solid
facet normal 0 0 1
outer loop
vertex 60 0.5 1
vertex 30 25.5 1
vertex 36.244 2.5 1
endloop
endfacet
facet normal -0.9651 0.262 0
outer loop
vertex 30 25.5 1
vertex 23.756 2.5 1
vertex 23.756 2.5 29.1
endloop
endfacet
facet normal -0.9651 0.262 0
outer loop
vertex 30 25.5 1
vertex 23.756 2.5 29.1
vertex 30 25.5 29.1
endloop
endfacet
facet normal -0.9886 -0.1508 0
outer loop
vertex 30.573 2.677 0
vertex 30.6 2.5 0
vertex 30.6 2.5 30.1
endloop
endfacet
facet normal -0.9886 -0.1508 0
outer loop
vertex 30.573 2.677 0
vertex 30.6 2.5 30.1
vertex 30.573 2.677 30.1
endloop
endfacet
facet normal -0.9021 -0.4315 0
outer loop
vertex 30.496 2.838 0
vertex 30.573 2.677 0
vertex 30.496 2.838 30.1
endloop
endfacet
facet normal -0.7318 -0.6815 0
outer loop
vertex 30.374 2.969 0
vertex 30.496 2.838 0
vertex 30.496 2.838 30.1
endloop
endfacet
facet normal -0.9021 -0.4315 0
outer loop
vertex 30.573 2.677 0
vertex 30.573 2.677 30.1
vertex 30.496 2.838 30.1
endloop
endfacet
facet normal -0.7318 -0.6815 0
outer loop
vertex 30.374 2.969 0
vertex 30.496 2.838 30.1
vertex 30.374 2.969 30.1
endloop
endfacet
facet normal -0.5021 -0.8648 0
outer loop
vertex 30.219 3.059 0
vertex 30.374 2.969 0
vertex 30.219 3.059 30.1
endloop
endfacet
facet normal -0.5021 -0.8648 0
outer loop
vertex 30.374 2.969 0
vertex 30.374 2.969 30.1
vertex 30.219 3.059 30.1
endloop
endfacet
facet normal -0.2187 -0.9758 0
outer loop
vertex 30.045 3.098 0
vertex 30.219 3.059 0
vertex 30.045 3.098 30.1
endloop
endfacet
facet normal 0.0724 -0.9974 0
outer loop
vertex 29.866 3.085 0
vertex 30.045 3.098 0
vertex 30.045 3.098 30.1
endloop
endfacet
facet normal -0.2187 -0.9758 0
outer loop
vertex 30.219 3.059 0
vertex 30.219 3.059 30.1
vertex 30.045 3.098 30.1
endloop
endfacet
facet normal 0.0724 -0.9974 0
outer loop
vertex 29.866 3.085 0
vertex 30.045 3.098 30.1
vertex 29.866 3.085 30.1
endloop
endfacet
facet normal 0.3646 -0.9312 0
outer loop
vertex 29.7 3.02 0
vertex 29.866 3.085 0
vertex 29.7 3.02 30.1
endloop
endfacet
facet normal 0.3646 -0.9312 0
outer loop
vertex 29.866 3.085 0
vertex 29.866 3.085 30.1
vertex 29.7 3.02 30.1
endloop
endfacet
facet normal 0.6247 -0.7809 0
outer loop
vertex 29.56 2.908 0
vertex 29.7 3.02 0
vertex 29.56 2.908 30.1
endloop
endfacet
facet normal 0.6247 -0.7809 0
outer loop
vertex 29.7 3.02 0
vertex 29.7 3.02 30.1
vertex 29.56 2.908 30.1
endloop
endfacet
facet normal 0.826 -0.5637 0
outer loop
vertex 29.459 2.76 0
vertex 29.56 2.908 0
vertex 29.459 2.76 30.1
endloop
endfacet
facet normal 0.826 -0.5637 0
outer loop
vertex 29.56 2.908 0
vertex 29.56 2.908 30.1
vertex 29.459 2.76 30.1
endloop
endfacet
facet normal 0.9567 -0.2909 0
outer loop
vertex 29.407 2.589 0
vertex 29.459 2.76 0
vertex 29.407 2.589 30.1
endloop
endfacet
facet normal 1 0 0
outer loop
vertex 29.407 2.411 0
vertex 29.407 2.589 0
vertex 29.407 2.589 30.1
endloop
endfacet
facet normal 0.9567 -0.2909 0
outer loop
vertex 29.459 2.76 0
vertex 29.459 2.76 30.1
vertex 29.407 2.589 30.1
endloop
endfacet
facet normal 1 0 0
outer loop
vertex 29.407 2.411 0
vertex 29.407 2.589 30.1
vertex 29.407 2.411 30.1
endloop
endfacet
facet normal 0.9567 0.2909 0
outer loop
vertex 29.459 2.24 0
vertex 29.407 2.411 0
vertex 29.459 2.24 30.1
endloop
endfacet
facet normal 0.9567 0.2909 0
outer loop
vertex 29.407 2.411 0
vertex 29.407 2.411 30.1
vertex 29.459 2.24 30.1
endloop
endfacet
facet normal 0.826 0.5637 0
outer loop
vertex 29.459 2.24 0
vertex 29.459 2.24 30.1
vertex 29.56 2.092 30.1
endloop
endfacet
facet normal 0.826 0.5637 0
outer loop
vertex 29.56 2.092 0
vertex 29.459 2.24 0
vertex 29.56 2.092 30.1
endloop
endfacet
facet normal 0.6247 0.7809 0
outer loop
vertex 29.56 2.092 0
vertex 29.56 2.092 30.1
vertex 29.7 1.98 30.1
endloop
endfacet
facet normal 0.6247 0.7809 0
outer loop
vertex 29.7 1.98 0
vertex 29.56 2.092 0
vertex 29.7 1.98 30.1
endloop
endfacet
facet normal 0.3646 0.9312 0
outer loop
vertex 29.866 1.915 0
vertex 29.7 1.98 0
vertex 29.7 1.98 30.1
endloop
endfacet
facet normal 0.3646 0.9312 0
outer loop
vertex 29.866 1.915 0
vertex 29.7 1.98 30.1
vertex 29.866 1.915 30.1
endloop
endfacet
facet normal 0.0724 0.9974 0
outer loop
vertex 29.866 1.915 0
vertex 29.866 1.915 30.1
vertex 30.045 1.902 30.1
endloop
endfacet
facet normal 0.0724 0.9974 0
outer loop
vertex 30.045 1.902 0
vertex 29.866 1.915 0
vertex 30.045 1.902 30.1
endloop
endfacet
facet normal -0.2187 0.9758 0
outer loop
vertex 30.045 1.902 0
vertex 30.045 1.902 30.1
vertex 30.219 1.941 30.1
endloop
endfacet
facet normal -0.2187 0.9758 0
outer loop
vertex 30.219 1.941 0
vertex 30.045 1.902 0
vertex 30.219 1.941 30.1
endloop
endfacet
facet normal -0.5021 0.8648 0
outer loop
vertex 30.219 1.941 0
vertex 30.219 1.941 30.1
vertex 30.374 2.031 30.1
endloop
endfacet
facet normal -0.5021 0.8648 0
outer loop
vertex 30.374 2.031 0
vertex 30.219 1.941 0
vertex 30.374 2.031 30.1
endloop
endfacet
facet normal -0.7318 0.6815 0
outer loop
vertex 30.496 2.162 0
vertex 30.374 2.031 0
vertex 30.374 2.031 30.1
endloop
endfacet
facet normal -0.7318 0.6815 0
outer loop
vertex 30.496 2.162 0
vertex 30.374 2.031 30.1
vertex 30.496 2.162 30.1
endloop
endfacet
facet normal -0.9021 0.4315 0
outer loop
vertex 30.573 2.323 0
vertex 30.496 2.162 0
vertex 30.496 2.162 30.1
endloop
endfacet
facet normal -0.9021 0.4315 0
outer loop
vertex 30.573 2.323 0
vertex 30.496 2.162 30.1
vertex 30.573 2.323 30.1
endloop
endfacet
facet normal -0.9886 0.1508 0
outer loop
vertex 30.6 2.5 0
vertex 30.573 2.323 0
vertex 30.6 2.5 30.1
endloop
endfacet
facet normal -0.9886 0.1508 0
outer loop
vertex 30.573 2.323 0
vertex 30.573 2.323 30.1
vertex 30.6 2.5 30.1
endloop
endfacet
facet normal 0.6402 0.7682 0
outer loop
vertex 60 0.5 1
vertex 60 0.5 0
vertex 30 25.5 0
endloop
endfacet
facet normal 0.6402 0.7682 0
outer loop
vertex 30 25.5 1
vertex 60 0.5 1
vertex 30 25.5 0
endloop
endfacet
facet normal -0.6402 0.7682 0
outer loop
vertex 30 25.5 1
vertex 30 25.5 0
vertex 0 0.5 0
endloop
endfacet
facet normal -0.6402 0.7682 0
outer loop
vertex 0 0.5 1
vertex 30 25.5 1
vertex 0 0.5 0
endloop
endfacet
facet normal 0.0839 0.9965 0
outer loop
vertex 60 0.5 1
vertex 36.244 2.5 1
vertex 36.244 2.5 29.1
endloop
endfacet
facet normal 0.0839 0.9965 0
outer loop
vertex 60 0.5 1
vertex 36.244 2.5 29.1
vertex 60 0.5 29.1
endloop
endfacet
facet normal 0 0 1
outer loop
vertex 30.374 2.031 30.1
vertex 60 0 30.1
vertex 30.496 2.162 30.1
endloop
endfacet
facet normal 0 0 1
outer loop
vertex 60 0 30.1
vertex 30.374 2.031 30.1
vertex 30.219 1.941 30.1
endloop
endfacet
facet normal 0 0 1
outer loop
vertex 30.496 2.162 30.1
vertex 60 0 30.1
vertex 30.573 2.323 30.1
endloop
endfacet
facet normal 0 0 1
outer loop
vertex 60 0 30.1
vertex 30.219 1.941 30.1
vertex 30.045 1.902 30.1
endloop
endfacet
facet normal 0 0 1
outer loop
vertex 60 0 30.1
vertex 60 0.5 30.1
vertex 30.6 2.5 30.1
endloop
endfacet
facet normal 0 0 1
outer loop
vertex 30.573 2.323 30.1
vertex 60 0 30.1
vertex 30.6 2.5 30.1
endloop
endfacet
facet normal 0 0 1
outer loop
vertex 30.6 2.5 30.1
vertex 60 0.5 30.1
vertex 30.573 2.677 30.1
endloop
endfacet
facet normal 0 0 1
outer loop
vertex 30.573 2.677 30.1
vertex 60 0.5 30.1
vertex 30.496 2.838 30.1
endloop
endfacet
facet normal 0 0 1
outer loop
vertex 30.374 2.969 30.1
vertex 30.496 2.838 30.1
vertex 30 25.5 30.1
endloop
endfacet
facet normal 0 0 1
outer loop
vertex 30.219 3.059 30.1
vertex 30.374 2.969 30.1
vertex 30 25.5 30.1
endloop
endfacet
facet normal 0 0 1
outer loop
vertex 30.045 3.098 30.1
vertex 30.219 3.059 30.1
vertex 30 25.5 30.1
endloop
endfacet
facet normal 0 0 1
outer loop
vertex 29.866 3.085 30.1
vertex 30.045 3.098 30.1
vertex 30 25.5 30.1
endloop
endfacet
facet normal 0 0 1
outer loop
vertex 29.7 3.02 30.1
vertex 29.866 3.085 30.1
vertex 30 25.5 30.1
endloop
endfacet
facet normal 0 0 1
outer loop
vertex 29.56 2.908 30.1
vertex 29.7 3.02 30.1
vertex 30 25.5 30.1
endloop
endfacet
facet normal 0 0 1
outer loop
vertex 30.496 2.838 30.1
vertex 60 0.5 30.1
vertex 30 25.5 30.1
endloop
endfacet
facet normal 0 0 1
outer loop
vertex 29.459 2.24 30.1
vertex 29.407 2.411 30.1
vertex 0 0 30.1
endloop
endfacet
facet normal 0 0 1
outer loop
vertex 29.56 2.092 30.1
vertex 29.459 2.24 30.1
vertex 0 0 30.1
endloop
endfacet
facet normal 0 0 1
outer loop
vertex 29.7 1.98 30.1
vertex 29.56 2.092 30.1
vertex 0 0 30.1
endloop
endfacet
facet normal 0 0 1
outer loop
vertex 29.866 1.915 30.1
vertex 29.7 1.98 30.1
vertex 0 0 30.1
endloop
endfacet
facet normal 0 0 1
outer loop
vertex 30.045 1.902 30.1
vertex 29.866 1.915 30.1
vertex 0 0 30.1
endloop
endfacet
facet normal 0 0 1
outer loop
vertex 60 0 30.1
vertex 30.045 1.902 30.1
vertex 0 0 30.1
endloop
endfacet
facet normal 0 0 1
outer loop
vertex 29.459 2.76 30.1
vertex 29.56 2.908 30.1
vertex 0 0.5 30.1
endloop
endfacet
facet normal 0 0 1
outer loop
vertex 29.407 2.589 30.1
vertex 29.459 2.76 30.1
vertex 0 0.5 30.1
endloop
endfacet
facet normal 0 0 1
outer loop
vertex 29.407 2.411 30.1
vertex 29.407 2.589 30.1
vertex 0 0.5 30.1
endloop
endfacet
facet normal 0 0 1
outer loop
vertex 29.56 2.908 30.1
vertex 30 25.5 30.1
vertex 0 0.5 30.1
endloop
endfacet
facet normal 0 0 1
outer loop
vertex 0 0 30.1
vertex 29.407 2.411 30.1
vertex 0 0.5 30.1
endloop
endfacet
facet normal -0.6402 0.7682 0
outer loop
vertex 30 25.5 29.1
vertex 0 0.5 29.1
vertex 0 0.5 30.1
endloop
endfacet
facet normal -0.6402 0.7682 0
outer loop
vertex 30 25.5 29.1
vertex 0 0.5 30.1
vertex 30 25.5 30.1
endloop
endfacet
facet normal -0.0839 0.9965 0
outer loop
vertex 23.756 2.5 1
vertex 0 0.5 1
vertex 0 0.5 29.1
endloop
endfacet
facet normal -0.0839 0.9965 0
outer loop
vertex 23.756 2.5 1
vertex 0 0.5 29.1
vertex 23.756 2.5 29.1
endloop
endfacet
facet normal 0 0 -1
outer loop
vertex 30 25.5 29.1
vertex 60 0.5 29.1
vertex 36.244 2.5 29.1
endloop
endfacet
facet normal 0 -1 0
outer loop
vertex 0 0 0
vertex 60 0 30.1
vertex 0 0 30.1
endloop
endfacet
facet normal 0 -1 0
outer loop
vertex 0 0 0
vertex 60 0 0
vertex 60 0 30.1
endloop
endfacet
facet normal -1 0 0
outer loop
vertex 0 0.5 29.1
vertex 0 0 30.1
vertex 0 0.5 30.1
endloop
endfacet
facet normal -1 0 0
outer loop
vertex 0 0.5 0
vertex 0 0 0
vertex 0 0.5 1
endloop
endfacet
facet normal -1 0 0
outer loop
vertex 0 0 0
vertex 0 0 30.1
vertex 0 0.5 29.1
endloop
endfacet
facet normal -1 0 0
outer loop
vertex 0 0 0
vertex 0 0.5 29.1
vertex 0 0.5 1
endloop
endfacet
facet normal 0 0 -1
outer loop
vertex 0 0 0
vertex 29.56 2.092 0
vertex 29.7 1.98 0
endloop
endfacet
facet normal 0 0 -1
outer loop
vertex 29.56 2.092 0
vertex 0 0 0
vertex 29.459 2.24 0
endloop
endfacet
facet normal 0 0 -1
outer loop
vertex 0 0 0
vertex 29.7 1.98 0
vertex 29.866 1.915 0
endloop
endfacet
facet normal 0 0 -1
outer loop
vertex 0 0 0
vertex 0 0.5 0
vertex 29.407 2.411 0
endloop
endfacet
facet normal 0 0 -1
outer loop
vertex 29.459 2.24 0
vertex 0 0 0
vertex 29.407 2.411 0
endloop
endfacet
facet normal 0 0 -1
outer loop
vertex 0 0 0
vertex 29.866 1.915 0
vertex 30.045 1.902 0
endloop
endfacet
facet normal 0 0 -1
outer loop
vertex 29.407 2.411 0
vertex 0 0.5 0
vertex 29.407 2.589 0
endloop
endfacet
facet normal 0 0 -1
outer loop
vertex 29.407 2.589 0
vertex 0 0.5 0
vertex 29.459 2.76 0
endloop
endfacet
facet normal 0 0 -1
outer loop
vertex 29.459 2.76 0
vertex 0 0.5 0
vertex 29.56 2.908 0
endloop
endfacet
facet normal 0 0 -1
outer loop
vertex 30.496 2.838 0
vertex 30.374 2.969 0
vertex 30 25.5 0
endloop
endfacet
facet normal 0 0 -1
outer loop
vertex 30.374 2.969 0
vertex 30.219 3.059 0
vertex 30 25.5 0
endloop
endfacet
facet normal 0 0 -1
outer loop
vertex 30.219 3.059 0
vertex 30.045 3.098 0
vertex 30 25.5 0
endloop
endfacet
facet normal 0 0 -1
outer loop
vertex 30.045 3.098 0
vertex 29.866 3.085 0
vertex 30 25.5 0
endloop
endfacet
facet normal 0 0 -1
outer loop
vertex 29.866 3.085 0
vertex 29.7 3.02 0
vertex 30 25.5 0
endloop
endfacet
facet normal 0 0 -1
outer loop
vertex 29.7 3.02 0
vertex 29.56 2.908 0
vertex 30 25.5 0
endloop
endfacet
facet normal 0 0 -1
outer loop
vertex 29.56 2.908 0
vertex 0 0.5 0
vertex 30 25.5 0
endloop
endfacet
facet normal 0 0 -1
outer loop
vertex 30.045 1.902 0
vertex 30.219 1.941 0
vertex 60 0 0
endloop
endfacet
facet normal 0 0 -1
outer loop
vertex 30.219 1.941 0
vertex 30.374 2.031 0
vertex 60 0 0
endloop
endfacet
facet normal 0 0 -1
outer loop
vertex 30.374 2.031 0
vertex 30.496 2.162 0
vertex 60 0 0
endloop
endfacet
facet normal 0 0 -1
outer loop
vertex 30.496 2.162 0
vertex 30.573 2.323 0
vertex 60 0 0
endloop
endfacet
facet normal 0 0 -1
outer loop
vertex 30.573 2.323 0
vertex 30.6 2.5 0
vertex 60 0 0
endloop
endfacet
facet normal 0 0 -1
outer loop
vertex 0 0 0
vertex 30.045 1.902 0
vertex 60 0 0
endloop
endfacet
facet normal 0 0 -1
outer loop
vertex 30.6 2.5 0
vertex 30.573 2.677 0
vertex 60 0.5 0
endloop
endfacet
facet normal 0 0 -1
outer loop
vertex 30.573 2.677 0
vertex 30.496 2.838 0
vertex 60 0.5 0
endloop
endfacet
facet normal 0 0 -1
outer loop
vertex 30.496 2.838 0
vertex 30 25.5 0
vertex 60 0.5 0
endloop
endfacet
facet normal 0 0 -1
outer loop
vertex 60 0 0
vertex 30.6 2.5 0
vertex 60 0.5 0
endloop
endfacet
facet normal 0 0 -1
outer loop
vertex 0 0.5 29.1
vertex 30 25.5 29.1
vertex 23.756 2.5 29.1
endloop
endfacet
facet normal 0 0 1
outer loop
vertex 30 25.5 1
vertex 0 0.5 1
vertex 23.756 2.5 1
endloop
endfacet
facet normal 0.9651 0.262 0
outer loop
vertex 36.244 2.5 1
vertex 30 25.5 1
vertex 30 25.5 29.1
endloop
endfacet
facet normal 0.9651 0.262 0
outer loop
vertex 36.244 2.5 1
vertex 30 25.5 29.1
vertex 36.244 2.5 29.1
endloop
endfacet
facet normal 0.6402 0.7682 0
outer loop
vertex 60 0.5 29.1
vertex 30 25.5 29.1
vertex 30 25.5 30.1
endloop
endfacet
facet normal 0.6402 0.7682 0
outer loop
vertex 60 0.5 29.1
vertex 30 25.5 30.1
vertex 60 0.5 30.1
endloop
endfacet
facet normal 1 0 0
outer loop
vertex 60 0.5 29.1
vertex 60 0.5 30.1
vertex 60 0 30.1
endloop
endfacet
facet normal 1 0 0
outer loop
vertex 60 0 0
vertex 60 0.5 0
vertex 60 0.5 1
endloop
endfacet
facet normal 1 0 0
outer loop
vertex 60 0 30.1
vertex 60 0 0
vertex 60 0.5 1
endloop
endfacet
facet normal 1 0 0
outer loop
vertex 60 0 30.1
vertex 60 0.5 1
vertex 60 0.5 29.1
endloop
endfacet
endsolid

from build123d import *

# Parameters (mm, degrees)
PAD_DEPTH    = 1
PAD001_DEPTH = 28.1
PAD002_DEPTH = 1
SKETCH003_R  = 0.6
POCKET_DEPTH = 30.1


with BuildPart() as part:
    # Sketch → Pad (new body)
    with BuildSketch(Plane.XY):
        Polygon((0, 0), (60, 0), (60, 0.5), (30, 25.5), (0, 0.5), align=None)
    extrude(amount=PAD_DEPTH)

    # Sketch001 (on Face7 of Pad) → Pad001 (join)
    with BuildSketch(Plane.XY.offset(1)):
        Polygon((0, 0), (0, 0.5), (23.756329, 2.5), (30, 25.5), (36.243671, 2.5), (60, 0.5), (60, 0), align=None)
    extrude(amount=PAD001_DEPTH)

    # Sketch002 (on Face13 of Pad001) → Pad002 (join)
    with BuildSketch(Plane.XY.offset(29.1)):
        Polygon((0, 0), (0, 0.5), (30, 25.5), (60, 0.5), (60, 0), align=None)
    extrude(amount=PAD002_DEPTH)

    # Sketch003 (on Face20 of Pad002) → Pocket (cut)
    with BuildSketch(Plane.XY.offset(30.1)):
        with Locations((30, 2.5)):
            Circle(SKETCH003_R)
    extrude(amount=-POCKET_DEPTH, mode=Mode.SUBTRACT)


solid = part.part
